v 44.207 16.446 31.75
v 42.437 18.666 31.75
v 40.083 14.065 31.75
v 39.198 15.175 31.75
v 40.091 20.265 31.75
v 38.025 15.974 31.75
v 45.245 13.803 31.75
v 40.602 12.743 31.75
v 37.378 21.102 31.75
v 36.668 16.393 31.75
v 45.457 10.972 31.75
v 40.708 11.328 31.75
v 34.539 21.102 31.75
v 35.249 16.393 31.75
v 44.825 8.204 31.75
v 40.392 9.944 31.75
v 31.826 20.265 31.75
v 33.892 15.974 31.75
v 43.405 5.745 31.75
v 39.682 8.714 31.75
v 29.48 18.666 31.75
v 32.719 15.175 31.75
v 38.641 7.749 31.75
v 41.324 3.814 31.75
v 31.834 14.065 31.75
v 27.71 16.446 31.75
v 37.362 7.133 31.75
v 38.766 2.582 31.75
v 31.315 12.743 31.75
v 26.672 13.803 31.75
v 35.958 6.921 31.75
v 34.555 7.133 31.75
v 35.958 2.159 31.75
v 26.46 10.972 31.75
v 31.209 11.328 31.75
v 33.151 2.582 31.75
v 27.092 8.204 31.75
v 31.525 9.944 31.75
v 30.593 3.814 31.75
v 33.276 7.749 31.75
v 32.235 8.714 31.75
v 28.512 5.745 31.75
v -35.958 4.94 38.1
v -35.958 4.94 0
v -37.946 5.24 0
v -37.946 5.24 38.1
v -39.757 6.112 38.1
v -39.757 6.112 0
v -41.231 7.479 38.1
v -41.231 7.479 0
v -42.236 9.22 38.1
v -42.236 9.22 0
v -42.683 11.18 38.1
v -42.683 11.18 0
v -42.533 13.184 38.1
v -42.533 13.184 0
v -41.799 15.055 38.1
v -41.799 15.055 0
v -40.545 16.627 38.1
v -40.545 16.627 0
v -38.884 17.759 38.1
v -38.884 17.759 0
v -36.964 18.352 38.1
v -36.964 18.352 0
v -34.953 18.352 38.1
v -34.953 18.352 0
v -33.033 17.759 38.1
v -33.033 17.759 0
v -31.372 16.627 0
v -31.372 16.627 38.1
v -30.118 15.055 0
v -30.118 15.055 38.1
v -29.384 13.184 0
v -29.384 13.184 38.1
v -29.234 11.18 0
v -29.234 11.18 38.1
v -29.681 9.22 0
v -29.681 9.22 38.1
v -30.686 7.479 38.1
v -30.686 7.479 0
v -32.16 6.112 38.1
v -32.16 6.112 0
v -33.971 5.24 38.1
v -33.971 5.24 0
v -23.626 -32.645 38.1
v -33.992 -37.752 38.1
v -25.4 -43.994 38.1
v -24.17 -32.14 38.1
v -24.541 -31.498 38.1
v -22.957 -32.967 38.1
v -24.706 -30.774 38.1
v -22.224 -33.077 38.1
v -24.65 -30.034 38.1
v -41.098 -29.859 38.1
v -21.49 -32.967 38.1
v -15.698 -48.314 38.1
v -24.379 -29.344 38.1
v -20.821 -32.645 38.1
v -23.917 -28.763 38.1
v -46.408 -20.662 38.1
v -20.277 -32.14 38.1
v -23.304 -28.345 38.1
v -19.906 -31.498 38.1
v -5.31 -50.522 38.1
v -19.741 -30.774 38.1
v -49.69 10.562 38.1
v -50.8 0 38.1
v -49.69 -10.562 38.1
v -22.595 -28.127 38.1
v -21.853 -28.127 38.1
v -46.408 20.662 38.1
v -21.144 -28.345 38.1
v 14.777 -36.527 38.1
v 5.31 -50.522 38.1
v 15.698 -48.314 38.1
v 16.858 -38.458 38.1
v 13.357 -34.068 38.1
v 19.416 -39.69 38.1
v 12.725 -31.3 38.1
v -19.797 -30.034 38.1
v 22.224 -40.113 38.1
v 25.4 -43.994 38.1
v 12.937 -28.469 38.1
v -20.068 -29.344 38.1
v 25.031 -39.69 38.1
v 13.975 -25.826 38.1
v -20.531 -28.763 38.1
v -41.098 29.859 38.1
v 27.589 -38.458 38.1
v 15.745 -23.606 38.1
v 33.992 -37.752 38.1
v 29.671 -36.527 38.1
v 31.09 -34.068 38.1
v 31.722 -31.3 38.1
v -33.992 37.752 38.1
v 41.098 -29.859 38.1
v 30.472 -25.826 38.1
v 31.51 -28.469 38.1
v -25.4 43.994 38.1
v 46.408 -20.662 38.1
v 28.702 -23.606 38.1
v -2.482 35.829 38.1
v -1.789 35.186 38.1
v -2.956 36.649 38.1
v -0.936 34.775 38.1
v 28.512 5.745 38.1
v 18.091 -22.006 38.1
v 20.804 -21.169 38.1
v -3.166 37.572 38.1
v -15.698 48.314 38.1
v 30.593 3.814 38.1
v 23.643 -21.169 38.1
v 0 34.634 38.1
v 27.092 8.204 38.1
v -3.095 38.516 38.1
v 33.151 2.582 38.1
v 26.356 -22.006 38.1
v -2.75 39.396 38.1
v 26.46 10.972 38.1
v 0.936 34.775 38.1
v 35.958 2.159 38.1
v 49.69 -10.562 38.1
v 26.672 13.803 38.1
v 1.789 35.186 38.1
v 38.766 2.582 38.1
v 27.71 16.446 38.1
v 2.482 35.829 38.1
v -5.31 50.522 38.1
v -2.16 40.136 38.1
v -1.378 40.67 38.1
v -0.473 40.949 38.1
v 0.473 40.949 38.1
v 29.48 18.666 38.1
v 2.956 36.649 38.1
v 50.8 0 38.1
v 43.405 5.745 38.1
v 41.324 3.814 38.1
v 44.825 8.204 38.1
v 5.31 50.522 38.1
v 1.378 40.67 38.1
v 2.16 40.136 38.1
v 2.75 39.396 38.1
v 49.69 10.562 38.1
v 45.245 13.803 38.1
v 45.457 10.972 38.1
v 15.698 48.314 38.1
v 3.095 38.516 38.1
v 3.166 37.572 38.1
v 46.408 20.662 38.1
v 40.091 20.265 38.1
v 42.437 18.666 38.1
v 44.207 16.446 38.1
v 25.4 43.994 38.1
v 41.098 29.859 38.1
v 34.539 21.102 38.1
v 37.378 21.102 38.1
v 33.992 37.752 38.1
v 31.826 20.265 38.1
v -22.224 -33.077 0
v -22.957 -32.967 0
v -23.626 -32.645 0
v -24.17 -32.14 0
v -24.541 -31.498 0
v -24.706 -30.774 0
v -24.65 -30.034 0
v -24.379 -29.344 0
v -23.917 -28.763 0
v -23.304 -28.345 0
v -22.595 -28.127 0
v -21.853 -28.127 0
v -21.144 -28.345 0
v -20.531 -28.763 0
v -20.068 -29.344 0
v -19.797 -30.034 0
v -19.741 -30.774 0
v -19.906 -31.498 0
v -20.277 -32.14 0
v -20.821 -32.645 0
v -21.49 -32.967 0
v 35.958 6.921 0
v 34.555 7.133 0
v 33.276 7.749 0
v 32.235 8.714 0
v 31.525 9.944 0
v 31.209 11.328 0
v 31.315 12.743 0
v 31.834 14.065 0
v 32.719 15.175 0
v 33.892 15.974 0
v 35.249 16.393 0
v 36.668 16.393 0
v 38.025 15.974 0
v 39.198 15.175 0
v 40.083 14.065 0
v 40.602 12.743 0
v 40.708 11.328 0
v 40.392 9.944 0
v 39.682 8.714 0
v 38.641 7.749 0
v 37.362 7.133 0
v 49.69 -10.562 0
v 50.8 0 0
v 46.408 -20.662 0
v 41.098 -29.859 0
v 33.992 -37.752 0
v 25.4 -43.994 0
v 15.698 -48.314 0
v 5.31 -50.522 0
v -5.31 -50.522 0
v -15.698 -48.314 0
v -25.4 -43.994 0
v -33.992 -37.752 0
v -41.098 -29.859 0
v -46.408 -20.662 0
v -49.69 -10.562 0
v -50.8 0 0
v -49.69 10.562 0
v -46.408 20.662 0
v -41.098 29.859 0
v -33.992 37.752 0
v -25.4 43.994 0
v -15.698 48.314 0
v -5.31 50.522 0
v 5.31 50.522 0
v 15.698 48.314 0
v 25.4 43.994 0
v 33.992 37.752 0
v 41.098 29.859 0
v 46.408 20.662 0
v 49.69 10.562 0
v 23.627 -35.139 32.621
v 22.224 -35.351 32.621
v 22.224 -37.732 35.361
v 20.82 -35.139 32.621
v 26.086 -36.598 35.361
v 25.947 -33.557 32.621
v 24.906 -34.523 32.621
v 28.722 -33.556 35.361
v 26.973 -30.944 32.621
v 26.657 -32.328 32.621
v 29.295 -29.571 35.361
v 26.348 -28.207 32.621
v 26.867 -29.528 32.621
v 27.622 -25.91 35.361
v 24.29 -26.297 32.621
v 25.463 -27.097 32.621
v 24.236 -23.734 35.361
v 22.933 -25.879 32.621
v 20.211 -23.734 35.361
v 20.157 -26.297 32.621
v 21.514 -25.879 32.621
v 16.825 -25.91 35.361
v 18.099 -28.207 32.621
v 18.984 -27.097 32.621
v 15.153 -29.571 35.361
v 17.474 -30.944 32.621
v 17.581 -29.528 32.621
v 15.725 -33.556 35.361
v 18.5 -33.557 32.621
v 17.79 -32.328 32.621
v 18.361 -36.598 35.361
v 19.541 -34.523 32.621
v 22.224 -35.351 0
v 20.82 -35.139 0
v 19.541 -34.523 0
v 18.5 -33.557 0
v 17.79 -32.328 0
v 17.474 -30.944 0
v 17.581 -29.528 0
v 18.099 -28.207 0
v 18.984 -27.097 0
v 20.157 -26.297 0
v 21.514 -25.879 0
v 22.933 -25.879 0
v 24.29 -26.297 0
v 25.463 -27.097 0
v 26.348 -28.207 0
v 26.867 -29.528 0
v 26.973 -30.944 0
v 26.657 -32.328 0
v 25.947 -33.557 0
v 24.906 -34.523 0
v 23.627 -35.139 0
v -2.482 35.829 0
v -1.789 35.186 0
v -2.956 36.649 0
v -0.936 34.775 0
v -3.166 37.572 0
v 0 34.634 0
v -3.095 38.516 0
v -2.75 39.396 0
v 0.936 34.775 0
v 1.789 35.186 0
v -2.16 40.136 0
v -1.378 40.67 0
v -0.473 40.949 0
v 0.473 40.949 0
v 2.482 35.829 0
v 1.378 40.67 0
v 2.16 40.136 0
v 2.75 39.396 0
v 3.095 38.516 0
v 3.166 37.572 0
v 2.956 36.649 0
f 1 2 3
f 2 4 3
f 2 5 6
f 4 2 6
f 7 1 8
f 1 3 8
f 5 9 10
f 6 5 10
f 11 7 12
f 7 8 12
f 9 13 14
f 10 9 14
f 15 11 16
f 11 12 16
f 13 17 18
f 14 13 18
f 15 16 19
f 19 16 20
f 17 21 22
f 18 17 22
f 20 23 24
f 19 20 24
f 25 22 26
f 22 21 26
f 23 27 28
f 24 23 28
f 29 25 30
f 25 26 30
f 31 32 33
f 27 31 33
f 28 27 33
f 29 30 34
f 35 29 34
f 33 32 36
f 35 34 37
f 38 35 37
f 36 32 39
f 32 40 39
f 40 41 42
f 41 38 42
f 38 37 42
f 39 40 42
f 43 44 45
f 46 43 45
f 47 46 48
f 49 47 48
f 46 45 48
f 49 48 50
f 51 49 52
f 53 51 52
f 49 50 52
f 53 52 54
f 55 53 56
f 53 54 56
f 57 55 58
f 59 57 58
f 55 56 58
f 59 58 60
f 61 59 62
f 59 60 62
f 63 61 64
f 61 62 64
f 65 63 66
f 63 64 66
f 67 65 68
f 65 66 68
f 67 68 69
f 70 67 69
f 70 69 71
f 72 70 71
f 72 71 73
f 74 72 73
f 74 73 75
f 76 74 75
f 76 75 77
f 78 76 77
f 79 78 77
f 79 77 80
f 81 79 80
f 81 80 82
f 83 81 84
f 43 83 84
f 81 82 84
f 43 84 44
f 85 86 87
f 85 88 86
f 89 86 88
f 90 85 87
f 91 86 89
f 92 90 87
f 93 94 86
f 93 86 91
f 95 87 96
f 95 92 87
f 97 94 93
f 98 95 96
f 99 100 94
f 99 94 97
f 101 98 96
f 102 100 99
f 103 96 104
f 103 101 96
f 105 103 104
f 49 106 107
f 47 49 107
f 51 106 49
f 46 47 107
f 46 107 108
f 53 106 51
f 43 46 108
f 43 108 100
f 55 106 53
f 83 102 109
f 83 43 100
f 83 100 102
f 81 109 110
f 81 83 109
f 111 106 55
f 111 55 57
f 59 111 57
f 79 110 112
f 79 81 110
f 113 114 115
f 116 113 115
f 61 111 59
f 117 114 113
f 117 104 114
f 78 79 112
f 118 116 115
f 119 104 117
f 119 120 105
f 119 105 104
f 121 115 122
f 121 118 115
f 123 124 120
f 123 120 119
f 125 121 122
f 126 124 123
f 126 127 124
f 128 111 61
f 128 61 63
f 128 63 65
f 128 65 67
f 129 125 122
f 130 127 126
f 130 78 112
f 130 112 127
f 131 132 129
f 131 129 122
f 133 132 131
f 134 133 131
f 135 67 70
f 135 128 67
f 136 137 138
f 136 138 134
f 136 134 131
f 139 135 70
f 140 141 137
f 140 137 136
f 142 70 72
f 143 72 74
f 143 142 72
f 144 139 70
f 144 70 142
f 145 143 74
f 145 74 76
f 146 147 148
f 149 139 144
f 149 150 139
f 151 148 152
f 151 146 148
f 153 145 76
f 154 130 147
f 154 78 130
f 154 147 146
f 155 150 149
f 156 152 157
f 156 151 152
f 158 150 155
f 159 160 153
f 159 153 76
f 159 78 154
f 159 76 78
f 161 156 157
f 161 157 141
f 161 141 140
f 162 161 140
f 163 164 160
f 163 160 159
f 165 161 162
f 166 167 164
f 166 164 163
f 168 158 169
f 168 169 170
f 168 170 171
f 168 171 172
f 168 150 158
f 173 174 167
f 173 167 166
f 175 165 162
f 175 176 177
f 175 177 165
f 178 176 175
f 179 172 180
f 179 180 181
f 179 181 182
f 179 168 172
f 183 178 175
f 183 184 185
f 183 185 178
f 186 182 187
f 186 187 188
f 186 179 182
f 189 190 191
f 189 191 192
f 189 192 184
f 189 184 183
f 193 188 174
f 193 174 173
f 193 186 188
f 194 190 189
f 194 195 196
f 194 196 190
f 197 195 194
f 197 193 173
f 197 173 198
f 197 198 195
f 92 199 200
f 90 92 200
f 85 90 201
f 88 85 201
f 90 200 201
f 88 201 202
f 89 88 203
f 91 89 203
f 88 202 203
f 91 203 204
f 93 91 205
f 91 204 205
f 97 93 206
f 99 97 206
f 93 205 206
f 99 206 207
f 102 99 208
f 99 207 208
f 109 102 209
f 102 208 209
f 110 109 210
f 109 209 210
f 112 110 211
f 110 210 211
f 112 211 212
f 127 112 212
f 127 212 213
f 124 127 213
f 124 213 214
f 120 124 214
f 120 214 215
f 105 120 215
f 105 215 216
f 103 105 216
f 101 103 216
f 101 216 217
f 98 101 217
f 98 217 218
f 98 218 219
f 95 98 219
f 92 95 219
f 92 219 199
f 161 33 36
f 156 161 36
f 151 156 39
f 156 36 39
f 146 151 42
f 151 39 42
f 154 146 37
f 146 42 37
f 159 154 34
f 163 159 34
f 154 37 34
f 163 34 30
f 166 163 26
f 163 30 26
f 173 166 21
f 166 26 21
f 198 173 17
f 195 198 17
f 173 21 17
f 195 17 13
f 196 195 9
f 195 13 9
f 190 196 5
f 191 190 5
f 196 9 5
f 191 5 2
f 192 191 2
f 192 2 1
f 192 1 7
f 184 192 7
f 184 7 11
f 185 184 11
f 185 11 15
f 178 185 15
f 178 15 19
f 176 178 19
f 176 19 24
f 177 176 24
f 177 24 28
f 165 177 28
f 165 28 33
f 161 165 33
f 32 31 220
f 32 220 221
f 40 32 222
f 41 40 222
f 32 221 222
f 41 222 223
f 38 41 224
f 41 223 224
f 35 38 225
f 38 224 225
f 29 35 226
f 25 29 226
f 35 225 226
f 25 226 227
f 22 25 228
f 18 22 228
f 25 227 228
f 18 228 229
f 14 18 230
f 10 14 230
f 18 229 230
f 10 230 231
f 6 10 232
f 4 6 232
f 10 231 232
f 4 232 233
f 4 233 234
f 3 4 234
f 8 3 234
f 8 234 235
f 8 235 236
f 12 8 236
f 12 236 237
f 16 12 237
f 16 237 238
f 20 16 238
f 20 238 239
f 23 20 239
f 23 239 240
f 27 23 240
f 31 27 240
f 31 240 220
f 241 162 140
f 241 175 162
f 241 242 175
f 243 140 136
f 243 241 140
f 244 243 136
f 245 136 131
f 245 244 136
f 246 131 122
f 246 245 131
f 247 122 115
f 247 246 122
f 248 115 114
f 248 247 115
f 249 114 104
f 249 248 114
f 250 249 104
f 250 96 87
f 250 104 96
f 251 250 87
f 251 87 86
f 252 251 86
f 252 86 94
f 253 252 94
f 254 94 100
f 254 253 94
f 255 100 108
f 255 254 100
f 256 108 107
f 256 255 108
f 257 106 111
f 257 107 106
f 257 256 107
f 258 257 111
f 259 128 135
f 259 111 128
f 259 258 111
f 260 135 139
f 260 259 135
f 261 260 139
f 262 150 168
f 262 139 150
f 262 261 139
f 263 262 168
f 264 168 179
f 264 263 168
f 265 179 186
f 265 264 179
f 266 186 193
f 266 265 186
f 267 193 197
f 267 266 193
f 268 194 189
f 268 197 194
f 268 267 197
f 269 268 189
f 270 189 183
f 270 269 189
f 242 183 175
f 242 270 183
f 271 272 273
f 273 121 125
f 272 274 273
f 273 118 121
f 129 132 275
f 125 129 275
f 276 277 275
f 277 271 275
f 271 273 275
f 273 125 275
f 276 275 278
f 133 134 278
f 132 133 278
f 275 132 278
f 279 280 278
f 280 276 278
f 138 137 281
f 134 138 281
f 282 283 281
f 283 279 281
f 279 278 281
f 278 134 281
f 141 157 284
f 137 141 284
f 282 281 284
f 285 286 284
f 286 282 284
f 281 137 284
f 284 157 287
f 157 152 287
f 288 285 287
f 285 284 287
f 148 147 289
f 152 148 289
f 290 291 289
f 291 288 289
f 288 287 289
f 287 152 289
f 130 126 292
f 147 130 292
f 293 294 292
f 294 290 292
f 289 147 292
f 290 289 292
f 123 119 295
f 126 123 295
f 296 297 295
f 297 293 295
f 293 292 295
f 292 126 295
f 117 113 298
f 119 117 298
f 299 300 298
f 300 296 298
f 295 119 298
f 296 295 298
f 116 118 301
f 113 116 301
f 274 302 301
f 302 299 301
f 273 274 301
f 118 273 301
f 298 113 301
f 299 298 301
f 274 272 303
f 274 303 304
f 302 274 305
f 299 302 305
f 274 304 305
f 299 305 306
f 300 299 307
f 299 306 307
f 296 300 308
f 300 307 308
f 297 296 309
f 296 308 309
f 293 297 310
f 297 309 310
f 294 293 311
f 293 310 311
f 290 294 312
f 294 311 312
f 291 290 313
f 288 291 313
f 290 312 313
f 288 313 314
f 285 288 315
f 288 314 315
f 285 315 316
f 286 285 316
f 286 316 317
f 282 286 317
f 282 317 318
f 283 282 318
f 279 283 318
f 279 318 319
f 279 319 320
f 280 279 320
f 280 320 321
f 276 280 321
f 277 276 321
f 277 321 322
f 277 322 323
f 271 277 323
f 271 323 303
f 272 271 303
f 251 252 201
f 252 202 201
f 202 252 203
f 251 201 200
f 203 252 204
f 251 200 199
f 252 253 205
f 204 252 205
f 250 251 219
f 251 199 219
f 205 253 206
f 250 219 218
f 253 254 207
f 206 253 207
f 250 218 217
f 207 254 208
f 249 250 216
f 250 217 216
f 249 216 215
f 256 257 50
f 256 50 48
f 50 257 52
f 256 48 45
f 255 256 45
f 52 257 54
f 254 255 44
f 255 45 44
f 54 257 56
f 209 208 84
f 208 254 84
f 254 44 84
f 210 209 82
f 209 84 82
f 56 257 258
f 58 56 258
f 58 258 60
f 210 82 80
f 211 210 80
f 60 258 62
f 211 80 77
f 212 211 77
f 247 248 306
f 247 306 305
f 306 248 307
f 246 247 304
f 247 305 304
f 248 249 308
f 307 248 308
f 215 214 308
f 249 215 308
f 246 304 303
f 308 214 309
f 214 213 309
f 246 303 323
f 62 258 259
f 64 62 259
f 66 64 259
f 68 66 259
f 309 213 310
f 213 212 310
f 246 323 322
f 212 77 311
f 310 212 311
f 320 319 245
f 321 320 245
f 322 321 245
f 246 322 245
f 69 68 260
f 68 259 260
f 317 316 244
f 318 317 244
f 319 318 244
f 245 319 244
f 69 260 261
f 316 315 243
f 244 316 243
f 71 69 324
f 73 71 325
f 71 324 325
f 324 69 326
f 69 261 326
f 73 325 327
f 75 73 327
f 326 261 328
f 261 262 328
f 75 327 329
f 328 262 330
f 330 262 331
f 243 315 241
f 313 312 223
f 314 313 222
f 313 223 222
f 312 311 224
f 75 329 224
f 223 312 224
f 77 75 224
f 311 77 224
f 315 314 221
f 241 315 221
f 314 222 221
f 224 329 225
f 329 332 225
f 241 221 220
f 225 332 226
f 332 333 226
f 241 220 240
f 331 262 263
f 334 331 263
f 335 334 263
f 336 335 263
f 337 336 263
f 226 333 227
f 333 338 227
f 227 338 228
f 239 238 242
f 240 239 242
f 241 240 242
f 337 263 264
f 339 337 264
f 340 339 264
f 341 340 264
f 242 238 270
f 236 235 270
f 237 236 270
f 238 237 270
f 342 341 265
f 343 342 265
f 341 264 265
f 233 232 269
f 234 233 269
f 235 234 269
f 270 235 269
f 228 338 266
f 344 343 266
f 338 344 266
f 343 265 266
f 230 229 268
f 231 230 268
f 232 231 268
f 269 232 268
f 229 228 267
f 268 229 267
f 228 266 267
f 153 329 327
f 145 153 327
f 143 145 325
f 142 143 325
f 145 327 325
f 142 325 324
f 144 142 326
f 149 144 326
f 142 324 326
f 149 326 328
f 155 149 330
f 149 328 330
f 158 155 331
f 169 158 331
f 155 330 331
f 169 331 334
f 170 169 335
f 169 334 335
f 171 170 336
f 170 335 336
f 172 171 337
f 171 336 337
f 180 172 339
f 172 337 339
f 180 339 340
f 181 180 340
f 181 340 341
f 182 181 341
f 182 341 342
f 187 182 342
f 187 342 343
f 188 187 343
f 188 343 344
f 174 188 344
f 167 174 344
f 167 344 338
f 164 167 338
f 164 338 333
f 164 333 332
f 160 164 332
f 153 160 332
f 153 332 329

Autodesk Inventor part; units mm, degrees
ref_plane "YZ Plane" through (0, 0, 0) normal (1, 0, 0) x (0, 1, 0)
ref_plane "XZ Plane" through (0, 0, 0) normal (0, 1, 0) x (-1, 0, 0)
ref_plane "XY Plane" through (0, 0, 0) normal (0, 0, 1) x (1, 0, 0)
sketch "Sketch1" plane through (0, 0, 0) normal (0, 0, 1) x (1, 0, 0)
  circle A0 centre (0, 0) radius 50.8
  dimension "d0" = 101.6
extrude "Extrusion1" add sketch "Sketch1" along normal blind 38.1
sketch "Sketch2" plane through (0, 0, 38.1) normal (0, 0, 1) x (1, 0, 0)
  circle A0 centre (0, 0) radius 50.8 projected
  point P0 (0, 37.809)
  point P1 (-35.9585, 11.6836)
  point P2 (-22.2236, -30.5881)
  point P3 (22.2236, -30.5881)
  point P4 (35.9585, 11.6836)
  dimension "d5" = 360
hole "Hole1" at (0, 37.809, 38.1) direction (0, 0, -1) diameter 6.35 end through all
hole "Hole2" at (35.9585, 11.6836, 38.1) direction (0, 0, -1) diameter 9.525 end through all counterbore diameter 19.05 counterbore depth 6.35
hole "Hole3" at (22.2236, -30.5881, 38.1) direction (0, 0, -1) diameter 9.525 end through all countersink diameter 19.05 countersink angle 82
hole "Hole4" at (-22.2236, -30.5881, 38.1) direction (0, 0, -1) diameter 4.9784 end through all thread size "1/4-20 UNC" class "1B" standard "ANSI Unified Screw Threads"
hole "Hole5" at (-35.9585, 11.6836, 38.1) direction (0, 0, -1) diameter 13.4874 end through all clearance for "Hex Head Bolt" size "1/2" standard "Ansi Unified Screw Threads"
properties part number "CircularPlate"
